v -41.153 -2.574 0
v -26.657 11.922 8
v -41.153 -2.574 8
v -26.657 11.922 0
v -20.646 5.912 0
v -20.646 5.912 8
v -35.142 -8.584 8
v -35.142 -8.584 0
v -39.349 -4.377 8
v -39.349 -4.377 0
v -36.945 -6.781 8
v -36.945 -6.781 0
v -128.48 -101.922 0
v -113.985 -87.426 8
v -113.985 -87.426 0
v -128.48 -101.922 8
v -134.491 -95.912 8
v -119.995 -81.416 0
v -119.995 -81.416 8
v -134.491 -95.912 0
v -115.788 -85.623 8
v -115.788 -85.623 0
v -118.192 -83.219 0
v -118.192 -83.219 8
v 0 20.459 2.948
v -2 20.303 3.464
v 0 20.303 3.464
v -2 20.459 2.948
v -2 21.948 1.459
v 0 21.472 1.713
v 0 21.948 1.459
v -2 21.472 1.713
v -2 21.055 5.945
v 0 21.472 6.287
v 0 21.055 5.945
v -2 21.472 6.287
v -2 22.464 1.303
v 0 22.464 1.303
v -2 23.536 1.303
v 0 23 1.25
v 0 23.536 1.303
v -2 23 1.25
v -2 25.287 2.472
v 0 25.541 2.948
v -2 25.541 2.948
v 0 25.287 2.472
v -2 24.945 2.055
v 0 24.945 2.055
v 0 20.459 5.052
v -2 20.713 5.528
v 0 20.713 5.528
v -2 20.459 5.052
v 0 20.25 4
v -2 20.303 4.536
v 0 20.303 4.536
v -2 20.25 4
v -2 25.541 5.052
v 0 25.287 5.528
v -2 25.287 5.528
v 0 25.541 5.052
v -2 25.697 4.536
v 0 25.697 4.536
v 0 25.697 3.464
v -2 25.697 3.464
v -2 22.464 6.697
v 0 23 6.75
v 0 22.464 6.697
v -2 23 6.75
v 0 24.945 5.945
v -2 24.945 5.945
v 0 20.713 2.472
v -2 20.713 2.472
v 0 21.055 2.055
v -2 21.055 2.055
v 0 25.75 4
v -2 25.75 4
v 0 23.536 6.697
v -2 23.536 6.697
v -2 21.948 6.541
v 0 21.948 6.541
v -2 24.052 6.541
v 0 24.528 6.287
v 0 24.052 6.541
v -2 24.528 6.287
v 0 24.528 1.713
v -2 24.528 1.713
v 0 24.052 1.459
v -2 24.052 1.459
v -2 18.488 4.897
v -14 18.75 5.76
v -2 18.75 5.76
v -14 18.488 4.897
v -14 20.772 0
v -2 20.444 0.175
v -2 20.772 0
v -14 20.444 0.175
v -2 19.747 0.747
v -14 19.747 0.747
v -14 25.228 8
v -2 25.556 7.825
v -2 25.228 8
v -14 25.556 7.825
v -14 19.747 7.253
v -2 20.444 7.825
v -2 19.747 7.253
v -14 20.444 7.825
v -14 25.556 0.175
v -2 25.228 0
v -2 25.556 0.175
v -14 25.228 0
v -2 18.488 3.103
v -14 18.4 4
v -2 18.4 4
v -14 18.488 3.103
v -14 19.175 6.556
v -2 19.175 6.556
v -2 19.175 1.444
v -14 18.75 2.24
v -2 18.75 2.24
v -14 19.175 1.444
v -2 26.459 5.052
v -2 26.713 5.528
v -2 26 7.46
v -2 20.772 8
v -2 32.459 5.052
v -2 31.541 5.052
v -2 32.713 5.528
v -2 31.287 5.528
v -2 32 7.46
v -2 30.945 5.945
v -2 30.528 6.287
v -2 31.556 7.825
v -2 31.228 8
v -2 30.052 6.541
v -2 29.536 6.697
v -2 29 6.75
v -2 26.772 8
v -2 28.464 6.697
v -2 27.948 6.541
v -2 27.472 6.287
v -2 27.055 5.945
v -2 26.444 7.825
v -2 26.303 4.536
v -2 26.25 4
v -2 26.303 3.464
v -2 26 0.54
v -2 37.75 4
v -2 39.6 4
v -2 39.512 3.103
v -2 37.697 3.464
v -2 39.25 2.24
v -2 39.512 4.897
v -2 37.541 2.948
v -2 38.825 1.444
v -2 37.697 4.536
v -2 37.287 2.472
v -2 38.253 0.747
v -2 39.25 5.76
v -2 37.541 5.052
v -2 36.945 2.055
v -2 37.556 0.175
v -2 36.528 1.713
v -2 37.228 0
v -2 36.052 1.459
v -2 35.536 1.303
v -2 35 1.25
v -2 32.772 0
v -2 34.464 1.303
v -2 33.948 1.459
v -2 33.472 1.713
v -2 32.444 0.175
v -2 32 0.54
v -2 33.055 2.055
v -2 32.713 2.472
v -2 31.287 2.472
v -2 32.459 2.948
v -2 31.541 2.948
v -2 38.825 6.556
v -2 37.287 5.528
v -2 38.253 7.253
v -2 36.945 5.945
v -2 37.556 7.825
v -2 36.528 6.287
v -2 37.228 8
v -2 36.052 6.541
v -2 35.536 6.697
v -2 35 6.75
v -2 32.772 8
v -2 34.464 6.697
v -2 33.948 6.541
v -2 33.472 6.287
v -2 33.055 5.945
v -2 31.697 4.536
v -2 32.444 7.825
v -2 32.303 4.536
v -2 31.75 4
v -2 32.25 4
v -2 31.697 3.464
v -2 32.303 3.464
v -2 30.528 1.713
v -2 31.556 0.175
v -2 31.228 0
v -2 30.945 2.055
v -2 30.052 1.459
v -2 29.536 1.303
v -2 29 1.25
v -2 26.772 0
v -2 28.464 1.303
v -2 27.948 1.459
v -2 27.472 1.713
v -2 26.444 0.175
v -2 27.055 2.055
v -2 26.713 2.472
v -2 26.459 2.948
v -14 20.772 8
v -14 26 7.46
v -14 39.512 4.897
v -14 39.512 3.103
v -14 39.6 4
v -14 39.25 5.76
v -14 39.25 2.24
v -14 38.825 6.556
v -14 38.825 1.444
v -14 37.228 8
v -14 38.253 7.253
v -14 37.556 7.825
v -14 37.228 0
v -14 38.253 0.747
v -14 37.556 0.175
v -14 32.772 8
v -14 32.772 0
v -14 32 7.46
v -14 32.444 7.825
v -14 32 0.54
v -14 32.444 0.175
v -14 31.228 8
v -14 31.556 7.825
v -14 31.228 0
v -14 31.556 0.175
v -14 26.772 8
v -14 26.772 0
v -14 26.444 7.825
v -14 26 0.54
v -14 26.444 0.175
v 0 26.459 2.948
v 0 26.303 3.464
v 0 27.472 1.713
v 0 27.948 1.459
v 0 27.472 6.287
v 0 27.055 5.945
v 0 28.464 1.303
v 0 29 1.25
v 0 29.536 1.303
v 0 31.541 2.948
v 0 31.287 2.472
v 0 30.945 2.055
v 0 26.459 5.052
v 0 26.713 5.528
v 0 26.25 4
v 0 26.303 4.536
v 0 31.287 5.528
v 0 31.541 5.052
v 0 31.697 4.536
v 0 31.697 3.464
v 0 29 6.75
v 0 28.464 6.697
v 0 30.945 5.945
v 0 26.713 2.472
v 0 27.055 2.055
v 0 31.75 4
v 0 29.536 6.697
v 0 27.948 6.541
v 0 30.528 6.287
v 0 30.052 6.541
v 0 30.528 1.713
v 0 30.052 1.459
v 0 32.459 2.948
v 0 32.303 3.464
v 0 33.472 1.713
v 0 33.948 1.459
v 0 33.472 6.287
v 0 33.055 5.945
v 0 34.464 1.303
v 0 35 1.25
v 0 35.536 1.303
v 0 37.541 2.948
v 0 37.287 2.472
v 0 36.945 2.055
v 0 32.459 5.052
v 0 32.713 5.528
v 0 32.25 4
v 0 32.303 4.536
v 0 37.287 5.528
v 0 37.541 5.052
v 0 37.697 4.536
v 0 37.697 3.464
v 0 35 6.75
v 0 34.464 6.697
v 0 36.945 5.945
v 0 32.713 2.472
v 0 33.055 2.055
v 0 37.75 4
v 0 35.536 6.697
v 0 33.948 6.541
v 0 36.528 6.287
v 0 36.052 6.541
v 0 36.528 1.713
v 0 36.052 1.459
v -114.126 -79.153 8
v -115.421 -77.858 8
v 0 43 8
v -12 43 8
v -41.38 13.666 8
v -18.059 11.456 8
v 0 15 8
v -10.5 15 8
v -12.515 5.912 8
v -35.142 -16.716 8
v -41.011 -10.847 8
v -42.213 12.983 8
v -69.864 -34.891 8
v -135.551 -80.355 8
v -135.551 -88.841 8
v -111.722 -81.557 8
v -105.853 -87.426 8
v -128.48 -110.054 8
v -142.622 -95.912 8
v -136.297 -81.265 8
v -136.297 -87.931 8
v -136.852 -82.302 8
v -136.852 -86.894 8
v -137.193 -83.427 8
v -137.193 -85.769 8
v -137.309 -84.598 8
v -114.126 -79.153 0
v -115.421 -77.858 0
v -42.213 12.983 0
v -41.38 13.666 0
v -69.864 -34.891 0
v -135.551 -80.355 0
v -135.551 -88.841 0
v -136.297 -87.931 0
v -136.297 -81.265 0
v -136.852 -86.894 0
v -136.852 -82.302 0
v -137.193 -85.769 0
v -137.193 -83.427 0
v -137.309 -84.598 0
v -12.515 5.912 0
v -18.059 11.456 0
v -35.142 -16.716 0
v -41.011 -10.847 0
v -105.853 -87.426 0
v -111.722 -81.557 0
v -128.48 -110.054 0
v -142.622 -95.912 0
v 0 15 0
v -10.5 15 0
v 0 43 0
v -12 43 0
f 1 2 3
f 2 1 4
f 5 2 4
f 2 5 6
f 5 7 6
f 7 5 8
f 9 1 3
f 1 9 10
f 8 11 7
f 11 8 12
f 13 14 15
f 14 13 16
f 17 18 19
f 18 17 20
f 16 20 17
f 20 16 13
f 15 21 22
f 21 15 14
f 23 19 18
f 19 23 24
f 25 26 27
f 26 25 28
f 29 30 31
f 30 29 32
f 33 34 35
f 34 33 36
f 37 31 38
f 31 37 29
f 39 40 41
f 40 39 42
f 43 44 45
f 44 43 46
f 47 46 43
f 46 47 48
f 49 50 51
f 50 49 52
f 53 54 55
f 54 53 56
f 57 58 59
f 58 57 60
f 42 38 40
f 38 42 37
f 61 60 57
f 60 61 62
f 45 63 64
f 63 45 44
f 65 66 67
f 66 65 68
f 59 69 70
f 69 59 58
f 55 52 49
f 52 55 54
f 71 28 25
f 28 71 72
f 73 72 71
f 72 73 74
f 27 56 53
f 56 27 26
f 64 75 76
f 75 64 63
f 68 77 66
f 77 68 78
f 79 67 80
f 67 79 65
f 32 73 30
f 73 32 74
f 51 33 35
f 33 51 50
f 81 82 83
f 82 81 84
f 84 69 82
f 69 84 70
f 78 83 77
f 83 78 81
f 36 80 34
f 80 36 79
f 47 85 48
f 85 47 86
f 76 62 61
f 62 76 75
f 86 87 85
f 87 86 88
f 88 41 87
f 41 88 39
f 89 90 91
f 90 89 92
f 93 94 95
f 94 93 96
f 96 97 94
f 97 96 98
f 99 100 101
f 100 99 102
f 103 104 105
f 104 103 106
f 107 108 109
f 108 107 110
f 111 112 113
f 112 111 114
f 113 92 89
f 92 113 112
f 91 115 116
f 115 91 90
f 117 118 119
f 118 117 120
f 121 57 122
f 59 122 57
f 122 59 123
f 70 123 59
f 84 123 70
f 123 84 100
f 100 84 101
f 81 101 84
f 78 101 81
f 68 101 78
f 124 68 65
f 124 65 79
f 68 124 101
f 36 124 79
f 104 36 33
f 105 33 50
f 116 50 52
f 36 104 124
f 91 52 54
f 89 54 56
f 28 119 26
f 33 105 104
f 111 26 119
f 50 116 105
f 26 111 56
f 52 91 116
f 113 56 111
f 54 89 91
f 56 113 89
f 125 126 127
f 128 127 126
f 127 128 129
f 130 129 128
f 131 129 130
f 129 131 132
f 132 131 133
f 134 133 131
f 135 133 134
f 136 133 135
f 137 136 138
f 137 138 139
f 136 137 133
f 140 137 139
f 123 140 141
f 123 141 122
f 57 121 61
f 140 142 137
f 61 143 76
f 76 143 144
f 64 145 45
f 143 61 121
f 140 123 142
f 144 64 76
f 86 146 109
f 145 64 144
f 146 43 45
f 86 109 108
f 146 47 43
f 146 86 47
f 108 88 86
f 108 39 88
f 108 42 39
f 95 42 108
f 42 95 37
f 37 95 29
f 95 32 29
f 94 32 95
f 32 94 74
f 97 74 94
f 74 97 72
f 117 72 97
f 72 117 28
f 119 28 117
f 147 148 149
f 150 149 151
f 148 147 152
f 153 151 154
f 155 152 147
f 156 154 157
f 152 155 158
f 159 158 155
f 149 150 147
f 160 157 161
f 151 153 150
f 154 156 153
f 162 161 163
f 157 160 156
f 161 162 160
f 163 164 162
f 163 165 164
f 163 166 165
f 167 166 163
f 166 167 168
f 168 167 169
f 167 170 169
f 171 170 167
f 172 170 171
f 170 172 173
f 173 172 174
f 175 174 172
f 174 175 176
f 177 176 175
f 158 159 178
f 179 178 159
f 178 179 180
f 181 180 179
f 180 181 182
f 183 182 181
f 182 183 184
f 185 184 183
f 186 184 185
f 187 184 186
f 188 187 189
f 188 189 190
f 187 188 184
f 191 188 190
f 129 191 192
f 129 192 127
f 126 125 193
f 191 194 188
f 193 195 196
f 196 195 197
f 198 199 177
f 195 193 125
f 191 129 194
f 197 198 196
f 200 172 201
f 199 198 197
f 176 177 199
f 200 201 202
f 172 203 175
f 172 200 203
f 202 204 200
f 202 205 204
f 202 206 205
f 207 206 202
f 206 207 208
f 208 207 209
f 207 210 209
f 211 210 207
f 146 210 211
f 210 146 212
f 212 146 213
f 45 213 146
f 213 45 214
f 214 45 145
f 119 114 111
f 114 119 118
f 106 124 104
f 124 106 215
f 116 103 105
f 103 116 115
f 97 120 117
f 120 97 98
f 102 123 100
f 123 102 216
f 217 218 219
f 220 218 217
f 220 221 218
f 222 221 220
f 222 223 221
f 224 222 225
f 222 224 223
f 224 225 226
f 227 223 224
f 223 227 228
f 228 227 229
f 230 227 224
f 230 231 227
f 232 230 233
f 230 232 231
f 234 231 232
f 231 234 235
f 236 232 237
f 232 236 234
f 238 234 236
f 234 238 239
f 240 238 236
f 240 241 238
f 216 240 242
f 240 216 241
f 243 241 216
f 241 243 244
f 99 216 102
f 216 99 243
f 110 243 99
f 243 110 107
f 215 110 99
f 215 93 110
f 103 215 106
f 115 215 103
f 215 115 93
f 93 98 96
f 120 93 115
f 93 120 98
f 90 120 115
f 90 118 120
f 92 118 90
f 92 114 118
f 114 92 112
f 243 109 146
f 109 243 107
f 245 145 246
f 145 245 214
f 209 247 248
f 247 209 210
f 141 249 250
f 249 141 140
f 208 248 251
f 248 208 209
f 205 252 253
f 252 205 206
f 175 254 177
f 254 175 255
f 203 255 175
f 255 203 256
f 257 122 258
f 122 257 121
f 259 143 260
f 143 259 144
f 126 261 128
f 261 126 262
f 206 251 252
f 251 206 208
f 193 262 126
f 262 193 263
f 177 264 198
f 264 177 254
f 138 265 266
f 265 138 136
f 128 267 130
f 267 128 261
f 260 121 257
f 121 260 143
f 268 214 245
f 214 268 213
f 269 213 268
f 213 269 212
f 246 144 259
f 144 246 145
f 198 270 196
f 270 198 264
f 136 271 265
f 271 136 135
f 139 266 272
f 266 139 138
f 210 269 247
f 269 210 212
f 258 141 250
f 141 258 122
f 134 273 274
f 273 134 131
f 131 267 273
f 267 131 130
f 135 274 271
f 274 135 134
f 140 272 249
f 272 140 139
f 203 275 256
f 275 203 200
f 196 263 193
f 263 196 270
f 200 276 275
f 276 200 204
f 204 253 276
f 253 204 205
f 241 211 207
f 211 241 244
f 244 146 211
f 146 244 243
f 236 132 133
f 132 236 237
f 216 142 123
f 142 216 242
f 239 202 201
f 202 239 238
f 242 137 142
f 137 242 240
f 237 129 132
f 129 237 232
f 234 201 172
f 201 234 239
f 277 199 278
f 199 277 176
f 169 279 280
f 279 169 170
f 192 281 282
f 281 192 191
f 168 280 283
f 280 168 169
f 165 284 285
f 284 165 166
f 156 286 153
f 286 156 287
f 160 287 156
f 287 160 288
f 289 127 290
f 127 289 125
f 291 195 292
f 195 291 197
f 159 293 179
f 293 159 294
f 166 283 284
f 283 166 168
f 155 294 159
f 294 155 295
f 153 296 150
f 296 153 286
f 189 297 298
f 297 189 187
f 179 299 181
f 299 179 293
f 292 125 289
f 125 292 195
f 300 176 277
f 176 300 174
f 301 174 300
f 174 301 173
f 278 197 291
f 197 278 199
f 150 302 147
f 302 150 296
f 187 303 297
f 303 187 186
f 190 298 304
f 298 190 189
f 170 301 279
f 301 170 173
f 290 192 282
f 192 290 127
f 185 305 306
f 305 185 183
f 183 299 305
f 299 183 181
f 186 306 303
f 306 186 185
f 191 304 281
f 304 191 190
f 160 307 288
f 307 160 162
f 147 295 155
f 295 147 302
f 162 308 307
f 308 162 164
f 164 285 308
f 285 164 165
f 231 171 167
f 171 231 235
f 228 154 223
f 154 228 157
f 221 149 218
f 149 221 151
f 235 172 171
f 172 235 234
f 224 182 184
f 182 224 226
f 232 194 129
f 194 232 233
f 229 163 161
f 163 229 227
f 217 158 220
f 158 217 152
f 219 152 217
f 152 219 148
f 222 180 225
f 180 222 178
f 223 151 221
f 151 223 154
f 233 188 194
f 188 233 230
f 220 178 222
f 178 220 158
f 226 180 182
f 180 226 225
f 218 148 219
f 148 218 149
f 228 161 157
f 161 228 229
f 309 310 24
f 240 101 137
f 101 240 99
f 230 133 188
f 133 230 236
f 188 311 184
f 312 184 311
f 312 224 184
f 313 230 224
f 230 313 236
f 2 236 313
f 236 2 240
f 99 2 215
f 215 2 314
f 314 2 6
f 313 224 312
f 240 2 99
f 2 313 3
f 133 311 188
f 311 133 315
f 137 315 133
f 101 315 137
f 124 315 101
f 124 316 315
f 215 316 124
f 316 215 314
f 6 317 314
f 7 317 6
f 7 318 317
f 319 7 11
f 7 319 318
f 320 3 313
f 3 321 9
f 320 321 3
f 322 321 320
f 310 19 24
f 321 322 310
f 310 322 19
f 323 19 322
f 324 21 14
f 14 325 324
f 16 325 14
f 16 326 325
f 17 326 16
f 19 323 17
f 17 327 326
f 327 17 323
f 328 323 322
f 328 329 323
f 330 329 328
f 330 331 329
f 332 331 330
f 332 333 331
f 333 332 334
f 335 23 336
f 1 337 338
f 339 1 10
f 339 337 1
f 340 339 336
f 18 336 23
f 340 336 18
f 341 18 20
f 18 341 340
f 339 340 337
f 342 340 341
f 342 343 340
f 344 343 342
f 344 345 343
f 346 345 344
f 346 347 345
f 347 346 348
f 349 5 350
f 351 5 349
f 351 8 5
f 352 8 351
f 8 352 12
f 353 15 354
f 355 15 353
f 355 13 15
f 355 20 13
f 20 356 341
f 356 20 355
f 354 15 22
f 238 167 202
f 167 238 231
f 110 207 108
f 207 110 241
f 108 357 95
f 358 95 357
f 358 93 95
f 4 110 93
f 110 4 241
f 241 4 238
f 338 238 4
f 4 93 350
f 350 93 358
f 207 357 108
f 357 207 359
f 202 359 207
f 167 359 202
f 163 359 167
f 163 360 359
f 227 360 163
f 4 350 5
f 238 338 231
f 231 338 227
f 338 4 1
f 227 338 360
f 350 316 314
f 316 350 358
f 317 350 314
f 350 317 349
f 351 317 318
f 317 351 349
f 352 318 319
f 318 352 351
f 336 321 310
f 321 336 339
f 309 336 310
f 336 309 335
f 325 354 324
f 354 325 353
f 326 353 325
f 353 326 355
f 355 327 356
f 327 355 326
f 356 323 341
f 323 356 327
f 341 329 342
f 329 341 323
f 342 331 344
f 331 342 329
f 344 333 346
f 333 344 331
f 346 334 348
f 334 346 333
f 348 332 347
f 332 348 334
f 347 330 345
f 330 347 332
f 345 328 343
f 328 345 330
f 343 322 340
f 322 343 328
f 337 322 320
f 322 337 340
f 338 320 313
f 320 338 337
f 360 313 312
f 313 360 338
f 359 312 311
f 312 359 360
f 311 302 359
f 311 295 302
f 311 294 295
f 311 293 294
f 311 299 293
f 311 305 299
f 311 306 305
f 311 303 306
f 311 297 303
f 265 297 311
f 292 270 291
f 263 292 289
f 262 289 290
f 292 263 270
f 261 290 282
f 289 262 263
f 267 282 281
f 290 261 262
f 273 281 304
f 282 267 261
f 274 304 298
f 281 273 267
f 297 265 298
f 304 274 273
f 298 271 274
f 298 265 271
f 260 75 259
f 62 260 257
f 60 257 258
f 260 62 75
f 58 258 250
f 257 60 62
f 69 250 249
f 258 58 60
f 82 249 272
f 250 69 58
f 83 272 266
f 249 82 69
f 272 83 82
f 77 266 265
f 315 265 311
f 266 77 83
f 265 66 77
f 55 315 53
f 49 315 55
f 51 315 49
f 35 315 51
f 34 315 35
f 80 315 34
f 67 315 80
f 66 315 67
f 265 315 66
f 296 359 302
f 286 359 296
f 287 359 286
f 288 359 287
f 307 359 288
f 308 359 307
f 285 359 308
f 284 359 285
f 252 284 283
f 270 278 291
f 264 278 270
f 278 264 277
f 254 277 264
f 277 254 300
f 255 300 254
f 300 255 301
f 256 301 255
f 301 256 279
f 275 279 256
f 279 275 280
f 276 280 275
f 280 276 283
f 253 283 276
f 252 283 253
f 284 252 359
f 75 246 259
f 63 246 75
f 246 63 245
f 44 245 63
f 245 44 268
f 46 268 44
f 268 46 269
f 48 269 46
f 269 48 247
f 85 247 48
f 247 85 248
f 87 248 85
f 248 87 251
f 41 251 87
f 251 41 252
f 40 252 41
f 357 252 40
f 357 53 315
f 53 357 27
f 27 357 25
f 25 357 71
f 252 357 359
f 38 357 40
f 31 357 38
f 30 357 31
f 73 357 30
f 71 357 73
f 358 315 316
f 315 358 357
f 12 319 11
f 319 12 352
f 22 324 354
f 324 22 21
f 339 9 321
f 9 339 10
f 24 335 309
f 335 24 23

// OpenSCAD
include <../lib/meshtastic-drybag-node-lib.scad>;
$fn = 40;
spine_print();
